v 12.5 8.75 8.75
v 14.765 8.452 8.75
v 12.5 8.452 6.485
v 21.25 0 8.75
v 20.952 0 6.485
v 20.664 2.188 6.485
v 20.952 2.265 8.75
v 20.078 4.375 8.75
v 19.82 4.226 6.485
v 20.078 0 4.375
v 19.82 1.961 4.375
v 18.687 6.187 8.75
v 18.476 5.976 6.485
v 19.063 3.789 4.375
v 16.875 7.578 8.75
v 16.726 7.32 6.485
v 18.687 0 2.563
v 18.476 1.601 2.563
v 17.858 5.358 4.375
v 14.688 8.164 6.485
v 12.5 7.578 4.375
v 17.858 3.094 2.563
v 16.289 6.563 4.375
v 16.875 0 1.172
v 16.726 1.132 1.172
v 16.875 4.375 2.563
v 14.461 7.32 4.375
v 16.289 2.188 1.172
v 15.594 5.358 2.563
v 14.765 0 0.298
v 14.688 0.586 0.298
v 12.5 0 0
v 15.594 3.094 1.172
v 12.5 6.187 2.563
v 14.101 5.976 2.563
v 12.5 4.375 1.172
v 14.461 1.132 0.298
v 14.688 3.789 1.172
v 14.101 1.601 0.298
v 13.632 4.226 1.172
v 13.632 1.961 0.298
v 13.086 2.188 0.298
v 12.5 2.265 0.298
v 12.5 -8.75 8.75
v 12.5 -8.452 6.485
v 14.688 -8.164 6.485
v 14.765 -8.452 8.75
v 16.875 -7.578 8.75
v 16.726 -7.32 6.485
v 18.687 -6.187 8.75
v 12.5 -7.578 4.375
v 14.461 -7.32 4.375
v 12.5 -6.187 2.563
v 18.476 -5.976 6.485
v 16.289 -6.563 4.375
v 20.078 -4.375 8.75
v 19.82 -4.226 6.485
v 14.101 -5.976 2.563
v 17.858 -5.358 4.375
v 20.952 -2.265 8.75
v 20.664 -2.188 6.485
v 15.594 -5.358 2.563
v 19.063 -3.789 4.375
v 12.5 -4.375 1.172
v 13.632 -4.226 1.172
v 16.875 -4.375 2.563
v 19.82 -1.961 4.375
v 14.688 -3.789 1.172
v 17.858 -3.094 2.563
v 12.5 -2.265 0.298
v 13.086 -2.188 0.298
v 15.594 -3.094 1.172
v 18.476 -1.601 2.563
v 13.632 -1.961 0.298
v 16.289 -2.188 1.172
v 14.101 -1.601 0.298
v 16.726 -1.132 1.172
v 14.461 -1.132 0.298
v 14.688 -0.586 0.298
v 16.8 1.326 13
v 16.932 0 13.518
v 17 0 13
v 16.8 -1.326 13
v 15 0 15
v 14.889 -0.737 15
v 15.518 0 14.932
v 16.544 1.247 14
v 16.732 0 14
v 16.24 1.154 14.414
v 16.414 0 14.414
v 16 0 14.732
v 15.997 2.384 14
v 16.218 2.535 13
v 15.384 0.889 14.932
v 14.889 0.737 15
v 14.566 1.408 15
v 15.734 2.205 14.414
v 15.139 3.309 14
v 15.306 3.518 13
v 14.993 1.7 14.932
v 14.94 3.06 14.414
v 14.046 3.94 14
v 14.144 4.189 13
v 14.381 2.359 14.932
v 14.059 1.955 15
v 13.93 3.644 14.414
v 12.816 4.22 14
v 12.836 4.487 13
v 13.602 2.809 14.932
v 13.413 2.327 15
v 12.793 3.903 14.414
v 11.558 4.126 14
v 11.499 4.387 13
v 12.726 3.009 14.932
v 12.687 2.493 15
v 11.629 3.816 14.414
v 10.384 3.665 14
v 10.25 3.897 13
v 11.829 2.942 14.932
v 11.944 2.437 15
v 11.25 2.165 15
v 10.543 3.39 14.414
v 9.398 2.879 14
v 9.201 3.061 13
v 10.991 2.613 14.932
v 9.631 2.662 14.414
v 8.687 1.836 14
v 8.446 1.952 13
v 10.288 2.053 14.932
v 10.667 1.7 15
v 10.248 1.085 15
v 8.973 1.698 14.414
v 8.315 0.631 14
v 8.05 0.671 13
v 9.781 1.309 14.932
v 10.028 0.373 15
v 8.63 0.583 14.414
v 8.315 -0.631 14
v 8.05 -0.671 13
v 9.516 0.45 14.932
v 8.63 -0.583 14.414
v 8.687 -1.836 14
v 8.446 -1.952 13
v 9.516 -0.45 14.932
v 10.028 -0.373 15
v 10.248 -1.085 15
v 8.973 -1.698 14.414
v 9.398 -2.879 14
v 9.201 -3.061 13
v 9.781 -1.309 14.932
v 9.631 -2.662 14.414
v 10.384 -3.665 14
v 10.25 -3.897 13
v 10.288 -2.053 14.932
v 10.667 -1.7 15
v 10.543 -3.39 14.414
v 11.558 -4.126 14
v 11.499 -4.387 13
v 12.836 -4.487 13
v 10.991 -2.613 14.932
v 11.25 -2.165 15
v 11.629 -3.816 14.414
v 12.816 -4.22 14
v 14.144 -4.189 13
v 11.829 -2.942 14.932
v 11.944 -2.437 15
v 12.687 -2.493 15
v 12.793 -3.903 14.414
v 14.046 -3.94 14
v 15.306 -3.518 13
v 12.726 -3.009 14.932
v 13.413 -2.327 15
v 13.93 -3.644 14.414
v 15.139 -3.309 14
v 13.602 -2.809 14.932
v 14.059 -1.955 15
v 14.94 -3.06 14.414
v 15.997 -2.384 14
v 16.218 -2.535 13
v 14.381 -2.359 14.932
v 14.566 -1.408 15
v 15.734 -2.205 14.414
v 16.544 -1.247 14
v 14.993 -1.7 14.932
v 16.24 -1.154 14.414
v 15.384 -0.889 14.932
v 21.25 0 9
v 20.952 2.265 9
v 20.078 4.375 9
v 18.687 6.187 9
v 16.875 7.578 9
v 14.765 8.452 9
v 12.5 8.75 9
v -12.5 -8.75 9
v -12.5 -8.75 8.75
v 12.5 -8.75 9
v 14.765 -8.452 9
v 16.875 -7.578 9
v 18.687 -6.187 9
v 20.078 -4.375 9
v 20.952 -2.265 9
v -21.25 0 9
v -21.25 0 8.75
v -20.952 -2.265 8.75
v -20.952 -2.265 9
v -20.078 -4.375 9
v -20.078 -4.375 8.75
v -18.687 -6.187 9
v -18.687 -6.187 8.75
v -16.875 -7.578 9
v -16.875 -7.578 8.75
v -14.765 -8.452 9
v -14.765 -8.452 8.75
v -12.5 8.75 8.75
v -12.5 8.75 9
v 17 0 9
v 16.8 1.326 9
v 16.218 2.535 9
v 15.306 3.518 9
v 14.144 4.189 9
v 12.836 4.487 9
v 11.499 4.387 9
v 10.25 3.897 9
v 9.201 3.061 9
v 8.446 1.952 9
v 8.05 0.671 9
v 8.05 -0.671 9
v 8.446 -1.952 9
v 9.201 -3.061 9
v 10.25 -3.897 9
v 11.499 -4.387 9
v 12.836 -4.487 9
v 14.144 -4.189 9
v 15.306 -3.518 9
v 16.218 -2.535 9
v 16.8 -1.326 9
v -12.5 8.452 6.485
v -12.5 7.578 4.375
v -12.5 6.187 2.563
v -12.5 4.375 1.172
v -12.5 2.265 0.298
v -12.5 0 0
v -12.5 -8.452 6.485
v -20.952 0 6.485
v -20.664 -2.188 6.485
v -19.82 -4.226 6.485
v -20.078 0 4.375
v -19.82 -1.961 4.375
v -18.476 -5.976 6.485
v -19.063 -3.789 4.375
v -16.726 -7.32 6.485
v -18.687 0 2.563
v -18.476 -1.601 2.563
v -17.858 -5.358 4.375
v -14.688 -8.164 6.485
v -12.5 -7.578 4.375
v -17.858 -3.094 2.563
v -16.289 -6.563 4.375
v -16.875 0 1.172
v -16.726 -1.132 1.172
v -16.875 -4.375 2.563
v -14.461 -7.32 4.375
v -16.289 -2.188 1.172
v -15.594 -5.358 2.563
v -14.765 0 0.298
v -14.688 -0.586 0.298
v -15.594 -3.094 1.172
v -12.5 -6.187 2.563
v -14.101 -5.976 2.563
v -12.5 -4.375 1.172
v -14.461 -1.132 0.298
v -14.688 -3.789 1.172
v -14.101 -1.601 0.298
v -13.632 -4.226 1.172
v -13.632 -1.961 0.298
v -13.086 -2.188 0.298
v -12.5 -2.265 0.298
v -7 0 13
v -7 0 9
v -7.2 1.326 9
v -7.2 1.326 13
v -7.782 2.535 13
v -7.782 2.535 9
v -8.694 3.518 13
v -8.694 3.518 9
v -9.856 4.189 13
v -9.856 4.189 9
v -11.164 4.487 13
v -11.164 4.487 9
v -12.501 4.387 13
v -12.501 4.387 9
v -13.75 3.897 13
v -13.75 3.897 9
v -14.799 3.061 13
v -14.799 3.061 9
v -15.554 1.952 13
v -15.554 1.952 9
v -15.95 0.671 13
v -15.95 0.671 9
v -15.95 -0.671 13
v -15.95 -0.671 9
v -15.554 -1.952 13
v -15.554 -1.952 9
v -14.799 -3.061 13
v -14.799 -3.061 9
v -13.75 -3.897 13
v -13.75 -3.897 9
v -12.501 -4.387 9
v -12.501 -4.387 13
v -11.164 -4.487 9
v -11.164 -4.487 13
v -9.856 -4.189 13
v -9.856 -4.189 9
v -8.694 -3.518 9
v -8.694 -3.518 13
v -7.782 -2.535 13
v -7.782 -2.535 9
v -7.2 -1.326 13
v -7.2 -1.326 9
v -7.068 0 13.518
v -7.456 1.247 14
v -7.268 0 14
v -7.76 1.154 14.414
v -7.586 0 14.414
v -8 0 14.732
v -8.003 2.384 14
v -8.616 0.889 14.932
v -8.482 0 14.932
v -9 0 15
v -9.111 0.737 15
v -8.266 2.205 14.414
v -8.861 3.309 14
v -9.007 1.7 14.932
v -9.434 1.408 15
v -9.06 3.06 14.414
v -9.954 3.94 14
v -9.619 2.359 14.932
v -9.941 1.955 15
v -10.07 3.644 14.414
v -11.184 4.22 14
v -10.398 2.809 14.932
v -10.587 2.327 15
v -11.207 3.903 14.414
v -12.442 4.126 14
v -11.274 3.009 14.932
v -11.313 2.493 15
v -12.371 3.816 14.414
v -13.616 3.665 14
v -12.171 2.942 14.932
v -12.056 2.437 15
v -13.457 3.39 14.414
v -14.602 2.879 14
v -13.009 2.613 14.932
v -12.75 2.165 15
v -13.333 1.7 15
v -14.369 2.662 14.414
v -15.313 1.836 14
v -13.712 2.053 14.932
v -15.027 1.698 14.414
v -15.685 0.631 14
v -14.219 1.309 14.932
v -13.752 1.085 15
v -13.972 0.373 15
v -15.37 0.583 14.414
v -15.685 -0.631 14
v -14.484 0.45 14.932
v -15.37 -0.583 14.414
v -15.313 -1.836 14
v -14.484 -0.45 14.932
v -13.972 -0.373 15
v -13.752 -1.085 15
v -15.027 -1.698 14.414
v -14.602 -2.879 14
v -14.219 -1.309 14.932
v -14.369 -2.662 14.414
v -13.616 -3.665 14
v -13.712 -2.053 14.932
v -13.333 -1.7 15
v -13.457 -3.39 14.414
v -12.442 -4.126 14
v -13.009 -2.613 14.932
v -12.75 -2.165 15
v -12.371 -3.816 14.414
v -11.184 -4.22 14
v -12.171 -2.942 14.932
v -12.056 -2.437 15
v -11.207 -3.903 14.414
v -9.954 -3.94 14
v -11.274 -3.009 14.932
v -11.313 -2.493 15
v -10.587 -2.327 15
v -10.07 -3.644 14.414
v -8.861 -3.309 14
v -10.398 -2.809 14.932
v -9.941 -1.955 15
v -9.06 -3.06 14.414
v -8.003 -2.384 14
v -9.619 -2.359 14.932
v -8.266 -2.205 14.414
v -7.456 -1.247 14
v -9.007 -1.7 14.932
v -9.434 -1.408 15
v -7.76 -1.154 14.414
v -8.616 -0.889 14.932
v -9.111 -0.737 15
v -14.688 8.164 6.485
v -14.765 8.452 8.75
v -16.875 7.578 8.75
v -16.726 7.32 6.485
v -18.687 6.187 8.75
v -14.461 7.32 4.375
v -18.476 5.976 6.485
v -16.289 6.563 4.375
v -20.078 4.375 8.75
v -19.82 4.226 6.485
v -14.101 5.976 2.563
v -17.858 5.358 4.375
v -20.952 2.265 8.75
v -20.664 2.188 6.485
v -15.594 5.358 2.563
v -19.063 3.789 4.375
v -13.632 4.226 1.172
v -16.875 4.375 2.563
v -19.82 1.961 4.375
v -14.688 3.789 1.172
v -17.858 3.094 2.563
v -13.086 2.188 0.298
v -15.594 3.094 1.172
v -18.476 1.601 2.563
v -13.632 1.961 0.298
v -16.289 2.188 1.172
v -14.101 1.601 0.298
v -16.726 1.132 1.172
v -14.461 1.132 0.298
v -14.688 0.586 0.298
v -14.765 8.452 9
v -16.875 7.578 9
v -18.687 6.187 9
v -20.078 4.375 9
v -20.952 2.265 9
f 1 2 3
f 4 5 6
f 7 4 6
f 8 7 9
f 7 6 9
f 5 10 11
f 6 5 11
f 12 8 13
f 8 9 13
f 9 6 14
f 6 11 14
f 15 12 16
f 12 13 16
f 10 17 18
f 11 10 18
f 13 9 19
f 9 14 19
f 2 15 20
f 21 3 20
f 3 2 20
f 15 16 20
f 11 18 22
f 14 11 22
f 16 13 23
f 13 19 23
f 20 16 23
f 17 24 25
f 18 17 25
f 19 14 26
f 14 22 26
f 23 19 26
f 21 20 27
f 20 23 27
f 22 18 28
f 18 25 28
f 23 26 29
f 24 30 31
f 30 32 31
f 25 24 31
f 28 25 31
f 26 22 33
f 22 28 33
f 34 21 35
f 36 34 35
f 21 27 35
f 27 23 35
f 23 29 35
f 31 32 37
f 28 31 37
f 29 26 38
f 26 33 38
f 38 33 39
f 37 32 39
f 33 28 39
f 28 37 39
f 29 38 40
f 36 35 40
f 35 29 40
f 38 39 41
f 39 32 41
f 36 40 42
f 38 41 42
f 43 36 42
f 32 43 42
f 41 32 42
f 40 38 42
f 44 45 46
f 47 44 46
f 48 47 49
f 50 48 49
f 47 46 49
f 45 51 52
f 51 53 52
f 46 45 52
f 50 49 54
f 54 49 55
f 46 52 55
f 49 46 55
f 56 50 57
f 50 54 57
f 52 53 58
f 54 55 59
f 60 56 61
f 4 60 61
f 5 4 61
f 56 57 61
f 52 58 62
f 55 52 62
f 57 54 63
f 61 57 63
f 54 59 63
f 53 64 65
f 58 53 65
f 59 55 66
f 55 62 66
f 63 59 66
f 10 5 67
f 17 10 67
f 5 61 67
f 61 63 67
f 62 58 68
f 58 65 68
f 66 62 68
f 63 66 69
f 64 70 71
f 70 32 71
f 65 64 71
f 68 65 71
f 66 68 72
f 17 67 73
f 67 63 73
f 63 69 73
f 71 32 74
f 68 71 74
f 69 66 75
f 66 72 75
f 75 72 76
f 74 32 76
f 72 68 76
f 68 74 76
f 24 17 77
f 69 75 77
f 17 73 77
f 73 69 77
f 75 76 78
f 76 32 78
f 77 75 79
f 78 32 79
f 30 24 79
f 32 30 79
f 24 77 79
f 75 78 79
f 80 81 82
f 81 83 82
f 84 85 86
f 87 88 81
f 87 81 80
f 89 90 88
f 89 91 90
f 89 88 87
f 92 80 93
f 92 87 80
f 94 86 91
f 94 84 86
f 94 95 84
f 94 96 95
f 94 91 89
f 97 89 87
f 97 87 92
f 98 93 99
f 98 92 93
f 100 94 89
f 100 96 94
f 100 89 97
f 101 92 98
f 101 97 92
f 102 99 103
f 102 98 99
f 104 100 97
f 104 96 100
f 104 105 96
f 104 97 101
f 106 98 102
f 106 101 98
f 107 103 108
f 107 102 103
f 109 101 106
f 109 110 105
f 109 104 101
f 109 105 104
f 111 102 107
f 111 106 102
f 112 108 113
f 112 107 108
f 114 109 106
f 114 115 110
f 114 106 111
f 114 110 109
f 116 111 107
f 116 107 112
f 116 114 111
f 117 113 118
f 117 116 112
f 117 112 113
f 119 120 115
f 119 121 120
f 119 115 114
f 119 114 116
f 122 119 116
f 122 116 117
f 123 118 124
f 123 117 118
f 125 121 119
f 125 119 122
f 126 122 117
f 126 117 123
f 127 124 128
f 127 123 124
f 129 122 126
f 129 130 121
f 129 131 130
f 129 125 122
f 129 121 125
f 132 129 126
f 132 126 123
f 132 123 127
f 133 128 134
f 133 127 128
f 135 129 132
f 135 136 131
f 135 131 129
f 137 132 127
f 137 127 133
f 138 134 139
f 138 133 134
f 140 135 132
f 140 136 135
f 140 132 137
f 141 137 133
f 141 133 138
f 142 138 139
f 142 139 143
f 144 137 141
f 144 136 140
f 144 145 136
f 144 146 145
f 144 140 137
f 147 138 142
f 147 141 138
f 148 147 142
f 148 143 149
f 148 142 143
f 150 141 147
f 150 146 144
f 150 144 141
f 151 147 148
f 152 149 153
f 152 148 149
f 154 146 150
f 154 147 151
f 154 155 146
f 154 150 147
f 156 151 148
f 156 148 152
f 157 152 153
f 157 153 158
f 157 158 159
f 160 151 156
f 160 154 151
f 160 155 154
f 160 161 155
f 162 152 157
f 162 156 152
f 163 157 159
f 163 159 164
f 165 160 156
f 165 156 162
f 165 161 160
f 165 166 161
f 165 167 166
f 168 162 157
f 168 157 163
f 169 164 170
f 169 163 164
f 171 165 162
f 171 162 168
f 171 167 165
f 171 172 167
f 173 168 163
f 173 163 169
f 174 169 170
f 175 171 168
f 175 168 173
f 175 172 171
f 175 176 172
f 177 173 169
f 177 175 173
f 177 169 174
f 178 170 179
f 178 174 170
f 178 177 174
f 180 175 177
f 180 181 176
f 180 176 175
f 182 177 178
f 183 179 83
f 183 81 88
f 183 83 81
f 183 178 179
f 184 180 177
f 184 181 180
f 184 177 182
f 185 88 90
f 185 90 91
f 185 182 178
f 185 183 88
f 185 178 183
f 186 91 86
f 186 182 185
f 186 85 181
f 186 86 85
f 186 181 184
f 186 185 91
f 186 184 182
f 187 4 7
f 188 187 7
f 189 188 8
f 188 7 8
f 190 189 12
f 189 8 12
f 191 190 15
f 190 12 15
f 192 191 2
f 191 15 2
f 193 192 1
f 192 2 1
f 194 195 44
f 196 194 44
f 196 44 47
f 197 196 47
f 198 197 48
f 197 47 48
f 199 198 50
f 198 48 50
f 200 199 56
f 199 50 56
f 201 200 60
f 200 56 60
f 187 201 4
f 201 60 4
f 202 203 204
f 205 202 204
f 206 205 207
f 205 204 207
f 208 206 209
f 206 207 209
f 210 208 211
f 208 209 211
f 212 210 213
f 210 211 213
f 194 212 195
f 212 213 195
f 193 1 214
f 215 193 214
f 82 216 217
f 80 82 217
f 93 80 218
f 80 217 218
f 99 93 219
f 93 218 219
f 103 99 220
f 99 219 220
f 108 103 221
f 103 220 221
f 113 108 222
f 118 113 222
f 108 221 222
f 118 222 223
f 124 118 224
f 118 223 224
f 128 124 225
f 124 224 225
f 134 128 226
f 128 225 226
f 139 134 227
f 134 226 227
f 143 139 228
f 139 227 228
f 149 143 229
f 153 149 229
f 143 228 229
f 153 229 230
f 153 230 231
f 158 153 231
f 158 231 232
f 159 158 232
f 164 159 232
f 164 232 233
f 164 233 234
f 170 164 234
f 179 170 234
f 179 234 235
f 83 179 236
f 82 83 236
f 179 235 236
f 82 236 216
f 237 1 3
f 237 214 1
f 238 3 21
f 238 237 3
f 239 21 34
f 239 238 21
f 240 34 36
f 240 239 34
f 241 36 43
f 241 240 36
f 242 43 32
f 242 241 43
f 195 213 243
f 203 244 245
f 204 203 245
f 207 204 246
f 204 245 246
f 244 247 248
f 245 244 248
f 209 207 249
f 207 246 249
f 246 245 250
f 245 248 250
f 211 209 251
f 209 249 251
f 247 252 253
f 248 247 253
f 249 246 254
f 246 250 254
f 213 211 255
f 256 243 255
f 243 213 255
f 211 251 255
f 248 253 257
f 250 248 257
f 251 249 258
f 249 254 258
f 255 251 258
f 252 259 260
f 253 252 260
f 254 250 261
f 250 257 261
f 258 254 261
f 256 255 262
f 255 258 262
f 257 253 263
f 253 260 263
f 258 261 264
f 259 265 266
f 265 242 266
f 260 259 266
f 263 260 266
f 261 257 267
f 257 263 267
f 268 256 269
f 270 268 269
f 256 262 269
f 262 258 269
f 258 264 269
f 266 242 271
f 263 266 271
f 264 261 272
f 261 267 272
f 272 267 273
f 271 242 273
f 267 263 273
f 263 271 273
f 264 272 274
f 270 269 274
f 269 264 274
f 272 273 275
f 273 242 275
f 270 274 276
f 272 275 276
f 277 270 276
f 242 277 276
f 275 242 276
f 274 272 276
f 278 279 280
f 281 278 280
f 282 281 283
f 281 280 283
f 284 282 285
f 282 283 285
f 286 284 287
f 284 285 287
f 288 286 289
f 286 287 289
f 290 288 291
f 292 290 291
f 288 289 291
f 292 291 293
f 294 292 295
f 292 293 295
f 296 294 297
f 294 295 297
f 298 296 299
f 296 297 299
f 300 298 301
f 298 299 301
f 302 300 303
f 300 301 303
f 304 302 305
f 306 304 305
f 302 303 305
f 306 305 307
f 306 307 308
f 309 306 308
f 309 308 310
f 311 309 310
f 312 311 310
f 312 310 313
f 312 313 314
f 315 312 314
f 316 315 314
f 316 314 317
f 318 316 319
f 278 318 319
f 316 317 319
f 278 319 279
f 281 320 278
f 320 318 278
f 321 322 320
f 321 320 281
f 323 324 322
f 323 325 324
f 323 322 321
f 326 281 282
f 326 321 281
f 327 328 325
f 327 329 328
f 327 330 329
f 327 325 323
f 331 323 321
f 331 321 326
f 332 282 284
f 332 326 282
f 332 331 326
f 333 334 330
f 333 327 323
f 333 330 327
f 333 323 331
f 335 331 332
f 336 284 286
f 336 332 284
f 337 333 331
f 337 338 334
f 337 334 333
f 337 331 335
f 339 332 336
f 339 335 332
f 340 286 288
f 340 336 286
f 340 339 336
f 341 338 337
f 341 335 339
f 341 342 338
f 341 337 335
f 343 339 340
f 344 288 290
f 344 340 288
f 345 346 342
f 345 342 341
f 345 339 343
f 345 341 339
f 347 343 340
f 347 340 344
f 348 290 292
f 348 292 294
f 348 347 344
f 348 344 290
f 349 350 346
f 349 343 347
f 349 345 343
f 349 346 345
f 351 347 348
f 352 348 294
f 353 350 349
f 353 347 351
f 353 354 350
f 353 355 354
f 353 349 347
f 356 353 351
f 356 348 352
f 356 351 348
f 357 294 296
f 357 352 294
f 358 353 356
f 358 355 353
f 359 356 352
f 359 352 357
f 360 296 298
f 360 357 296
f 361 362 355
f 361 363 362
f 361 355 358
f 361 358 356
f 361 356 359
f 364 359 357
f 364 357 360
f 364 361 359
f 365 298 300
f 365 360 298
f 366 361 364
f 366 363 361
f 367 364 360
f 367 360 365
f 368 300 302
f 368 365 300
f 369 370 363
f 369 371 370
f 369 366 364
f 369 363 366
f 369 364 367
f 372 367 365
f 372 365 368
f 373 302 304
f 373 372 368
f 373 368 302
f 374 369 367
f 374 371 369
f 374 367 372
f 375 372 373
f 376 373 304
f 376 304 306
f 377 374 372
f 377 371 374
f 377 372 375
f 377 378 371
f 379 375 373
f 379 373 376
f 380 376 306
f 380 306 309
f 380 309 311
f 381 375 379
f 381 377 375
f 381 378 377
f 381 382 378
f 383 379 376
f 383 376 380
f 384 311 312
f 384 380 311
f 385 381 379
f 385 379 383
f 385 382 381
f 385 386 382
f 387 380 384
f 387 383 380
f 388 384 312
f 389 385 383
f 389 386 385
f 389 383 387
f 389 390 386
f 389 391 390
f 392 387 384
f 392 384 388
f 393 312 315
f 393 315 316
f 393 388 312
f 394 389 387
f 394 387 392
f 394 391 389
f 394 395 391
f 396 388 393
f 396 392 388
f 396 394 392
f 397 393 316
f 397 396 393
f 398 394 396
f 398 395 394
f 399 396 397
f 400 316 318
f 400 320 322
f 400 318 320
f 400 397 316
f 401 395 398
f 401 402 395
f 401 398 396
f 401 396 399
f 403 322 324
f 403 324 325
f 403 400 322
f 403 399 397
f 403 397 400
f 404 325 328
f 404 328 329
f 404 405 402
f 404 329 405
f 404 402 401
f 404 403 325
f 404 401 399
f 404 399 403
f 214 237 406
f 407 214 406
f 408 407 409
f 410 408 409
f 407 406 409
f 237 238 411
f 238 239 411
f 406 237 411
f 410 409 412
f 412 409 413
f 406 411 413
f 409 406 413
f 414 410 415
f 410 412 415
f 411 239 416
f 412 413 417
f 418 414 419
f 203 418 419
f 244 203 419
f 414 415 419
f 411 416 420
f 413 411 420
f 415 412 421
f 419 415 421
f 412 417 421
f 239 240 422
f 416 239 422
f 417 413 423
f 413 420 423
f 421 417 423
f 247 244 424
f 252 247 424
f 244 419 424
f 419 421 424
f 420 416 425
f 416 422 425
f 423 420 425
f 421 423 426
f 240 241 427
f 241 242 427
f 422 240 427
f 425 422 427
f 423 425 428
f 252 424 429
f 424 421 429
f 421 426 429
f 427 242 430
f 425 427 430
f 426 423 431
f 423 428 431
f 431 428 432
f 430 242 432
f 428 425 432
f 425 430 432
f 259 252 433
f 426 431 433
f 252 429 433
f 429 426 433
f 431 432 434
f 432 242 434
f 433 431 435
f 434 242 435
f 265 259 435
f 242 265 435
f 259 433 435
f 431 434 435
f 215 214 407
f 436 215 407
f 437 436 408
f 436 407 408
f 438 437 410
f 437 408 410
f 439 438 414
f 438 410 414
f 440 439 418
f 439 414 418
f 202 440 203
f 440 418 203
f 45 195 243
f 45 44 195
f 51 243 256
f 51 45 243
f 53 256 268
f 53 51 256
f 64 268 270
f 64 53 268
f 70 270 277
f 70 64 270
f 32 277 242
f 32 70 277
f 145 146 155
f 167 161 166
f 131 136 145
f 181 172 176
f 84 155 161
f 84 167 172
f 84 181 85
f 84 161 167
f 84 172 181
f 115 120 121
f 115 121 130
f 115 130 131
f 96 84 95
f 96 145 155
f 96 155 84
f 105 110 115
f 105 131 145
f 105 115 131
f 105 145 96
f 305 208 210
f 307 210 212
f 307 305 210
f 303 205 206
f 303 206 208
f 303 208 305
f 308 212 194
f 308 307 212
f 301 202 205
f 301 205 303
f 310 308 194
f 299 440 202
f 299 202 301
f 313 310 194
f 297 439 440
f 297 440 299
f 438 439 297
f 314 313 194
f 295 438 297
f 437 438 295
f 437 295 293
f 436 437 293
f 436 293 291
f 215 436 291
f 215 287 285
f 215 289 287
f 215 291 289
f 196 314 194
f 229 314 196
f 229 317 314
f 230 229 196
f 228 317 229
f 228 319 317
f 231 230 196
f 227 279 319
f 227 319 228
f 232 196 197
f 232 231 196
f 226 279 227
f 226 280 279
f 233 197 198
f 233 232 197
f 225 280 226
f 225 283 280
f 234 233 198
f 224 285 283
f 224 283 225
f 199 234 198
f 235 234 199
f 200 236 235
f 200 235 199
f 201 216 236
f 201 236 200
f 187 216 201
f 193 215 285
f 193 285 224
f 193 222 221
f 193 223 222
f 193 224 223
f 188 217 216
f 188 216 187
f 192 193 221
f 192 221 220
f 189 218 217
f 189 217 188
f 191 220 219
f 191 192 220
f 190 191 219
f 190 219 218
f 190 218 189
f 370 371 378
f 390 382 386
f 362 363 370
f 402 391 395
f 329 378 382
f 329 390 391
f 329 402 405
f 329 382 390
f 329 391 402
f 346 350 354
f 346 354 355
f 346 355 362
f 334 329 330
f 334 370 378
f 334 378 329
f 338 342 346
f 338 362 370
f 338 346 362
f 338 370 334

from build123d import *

# Parameters (mm, degrees)
F1_DEPTH = 9
F2_R     = 8.74999
F3_R     = 4.5
F4_DEPTH = 6
F5_R     = 2


# Not quite as in the source:
# - a fillet or chamfer is up to 0.001 mm smaller than in the source, because OpenCascade refuses the exact size


with BuildPart() as f1:
    # F0 (on Top) → F1 (new body)
    with BuildSketch(Plane.XY):
        with BuildLine():
            Line((12.5, 8.75), (-12.5, 8.75))
            ThreePointArc((-12.5, 8.75), (-18.6871843354, 6.1871843354), (-21.25, 0))
            ThreePointArc((-21.25, 0), (-18.6871843354, -6.1871843354), (-12.5, -8.75))
            Line((-12.5, -8.75), (12.5, -8.75))
            ThreePointArc((12.5, -8.75), (18.6871843354, -6.1871843354), (21.25, 0))
            ThreePointArc((21.25, 0), (18.6871843354, 6.1871843354), (12.5, 8.75))
        make_face()
    extrude(amount=F1_DEPTH)

    # F2 (radius 8.75 in the source; OpenCascade refuses exactly that, so slightly less here)
    f2_edges = [f1.edges().sort_by_distance(p)[0] for p in [
        (21.25, 0, 0),
        (-21.25, 0, 0),
        (0, -8.75, 0),
        (0, 8.75, 0),
    ]]
    fillet(f2_edges, radius=F2_R)

    # F3 (on face) → F4 (join)
    with BuildSketch(Plane.XY.offset(9)):
        with Locations((12.5, 0)):
            Circle(F3_R)
        with Locations((-11.5, 0)):
            Circle(F3_R)
    extrude(amount=F4_DEPTH)

    # F5
    f5_edges = [f1.edges().sort_by_distance(p)[0] for p in [
        (-16, 0, 15),
        (8, 0, 15),
    ]]
    fillet(f5_edges, radius=F5_R)


solid = f1.part
